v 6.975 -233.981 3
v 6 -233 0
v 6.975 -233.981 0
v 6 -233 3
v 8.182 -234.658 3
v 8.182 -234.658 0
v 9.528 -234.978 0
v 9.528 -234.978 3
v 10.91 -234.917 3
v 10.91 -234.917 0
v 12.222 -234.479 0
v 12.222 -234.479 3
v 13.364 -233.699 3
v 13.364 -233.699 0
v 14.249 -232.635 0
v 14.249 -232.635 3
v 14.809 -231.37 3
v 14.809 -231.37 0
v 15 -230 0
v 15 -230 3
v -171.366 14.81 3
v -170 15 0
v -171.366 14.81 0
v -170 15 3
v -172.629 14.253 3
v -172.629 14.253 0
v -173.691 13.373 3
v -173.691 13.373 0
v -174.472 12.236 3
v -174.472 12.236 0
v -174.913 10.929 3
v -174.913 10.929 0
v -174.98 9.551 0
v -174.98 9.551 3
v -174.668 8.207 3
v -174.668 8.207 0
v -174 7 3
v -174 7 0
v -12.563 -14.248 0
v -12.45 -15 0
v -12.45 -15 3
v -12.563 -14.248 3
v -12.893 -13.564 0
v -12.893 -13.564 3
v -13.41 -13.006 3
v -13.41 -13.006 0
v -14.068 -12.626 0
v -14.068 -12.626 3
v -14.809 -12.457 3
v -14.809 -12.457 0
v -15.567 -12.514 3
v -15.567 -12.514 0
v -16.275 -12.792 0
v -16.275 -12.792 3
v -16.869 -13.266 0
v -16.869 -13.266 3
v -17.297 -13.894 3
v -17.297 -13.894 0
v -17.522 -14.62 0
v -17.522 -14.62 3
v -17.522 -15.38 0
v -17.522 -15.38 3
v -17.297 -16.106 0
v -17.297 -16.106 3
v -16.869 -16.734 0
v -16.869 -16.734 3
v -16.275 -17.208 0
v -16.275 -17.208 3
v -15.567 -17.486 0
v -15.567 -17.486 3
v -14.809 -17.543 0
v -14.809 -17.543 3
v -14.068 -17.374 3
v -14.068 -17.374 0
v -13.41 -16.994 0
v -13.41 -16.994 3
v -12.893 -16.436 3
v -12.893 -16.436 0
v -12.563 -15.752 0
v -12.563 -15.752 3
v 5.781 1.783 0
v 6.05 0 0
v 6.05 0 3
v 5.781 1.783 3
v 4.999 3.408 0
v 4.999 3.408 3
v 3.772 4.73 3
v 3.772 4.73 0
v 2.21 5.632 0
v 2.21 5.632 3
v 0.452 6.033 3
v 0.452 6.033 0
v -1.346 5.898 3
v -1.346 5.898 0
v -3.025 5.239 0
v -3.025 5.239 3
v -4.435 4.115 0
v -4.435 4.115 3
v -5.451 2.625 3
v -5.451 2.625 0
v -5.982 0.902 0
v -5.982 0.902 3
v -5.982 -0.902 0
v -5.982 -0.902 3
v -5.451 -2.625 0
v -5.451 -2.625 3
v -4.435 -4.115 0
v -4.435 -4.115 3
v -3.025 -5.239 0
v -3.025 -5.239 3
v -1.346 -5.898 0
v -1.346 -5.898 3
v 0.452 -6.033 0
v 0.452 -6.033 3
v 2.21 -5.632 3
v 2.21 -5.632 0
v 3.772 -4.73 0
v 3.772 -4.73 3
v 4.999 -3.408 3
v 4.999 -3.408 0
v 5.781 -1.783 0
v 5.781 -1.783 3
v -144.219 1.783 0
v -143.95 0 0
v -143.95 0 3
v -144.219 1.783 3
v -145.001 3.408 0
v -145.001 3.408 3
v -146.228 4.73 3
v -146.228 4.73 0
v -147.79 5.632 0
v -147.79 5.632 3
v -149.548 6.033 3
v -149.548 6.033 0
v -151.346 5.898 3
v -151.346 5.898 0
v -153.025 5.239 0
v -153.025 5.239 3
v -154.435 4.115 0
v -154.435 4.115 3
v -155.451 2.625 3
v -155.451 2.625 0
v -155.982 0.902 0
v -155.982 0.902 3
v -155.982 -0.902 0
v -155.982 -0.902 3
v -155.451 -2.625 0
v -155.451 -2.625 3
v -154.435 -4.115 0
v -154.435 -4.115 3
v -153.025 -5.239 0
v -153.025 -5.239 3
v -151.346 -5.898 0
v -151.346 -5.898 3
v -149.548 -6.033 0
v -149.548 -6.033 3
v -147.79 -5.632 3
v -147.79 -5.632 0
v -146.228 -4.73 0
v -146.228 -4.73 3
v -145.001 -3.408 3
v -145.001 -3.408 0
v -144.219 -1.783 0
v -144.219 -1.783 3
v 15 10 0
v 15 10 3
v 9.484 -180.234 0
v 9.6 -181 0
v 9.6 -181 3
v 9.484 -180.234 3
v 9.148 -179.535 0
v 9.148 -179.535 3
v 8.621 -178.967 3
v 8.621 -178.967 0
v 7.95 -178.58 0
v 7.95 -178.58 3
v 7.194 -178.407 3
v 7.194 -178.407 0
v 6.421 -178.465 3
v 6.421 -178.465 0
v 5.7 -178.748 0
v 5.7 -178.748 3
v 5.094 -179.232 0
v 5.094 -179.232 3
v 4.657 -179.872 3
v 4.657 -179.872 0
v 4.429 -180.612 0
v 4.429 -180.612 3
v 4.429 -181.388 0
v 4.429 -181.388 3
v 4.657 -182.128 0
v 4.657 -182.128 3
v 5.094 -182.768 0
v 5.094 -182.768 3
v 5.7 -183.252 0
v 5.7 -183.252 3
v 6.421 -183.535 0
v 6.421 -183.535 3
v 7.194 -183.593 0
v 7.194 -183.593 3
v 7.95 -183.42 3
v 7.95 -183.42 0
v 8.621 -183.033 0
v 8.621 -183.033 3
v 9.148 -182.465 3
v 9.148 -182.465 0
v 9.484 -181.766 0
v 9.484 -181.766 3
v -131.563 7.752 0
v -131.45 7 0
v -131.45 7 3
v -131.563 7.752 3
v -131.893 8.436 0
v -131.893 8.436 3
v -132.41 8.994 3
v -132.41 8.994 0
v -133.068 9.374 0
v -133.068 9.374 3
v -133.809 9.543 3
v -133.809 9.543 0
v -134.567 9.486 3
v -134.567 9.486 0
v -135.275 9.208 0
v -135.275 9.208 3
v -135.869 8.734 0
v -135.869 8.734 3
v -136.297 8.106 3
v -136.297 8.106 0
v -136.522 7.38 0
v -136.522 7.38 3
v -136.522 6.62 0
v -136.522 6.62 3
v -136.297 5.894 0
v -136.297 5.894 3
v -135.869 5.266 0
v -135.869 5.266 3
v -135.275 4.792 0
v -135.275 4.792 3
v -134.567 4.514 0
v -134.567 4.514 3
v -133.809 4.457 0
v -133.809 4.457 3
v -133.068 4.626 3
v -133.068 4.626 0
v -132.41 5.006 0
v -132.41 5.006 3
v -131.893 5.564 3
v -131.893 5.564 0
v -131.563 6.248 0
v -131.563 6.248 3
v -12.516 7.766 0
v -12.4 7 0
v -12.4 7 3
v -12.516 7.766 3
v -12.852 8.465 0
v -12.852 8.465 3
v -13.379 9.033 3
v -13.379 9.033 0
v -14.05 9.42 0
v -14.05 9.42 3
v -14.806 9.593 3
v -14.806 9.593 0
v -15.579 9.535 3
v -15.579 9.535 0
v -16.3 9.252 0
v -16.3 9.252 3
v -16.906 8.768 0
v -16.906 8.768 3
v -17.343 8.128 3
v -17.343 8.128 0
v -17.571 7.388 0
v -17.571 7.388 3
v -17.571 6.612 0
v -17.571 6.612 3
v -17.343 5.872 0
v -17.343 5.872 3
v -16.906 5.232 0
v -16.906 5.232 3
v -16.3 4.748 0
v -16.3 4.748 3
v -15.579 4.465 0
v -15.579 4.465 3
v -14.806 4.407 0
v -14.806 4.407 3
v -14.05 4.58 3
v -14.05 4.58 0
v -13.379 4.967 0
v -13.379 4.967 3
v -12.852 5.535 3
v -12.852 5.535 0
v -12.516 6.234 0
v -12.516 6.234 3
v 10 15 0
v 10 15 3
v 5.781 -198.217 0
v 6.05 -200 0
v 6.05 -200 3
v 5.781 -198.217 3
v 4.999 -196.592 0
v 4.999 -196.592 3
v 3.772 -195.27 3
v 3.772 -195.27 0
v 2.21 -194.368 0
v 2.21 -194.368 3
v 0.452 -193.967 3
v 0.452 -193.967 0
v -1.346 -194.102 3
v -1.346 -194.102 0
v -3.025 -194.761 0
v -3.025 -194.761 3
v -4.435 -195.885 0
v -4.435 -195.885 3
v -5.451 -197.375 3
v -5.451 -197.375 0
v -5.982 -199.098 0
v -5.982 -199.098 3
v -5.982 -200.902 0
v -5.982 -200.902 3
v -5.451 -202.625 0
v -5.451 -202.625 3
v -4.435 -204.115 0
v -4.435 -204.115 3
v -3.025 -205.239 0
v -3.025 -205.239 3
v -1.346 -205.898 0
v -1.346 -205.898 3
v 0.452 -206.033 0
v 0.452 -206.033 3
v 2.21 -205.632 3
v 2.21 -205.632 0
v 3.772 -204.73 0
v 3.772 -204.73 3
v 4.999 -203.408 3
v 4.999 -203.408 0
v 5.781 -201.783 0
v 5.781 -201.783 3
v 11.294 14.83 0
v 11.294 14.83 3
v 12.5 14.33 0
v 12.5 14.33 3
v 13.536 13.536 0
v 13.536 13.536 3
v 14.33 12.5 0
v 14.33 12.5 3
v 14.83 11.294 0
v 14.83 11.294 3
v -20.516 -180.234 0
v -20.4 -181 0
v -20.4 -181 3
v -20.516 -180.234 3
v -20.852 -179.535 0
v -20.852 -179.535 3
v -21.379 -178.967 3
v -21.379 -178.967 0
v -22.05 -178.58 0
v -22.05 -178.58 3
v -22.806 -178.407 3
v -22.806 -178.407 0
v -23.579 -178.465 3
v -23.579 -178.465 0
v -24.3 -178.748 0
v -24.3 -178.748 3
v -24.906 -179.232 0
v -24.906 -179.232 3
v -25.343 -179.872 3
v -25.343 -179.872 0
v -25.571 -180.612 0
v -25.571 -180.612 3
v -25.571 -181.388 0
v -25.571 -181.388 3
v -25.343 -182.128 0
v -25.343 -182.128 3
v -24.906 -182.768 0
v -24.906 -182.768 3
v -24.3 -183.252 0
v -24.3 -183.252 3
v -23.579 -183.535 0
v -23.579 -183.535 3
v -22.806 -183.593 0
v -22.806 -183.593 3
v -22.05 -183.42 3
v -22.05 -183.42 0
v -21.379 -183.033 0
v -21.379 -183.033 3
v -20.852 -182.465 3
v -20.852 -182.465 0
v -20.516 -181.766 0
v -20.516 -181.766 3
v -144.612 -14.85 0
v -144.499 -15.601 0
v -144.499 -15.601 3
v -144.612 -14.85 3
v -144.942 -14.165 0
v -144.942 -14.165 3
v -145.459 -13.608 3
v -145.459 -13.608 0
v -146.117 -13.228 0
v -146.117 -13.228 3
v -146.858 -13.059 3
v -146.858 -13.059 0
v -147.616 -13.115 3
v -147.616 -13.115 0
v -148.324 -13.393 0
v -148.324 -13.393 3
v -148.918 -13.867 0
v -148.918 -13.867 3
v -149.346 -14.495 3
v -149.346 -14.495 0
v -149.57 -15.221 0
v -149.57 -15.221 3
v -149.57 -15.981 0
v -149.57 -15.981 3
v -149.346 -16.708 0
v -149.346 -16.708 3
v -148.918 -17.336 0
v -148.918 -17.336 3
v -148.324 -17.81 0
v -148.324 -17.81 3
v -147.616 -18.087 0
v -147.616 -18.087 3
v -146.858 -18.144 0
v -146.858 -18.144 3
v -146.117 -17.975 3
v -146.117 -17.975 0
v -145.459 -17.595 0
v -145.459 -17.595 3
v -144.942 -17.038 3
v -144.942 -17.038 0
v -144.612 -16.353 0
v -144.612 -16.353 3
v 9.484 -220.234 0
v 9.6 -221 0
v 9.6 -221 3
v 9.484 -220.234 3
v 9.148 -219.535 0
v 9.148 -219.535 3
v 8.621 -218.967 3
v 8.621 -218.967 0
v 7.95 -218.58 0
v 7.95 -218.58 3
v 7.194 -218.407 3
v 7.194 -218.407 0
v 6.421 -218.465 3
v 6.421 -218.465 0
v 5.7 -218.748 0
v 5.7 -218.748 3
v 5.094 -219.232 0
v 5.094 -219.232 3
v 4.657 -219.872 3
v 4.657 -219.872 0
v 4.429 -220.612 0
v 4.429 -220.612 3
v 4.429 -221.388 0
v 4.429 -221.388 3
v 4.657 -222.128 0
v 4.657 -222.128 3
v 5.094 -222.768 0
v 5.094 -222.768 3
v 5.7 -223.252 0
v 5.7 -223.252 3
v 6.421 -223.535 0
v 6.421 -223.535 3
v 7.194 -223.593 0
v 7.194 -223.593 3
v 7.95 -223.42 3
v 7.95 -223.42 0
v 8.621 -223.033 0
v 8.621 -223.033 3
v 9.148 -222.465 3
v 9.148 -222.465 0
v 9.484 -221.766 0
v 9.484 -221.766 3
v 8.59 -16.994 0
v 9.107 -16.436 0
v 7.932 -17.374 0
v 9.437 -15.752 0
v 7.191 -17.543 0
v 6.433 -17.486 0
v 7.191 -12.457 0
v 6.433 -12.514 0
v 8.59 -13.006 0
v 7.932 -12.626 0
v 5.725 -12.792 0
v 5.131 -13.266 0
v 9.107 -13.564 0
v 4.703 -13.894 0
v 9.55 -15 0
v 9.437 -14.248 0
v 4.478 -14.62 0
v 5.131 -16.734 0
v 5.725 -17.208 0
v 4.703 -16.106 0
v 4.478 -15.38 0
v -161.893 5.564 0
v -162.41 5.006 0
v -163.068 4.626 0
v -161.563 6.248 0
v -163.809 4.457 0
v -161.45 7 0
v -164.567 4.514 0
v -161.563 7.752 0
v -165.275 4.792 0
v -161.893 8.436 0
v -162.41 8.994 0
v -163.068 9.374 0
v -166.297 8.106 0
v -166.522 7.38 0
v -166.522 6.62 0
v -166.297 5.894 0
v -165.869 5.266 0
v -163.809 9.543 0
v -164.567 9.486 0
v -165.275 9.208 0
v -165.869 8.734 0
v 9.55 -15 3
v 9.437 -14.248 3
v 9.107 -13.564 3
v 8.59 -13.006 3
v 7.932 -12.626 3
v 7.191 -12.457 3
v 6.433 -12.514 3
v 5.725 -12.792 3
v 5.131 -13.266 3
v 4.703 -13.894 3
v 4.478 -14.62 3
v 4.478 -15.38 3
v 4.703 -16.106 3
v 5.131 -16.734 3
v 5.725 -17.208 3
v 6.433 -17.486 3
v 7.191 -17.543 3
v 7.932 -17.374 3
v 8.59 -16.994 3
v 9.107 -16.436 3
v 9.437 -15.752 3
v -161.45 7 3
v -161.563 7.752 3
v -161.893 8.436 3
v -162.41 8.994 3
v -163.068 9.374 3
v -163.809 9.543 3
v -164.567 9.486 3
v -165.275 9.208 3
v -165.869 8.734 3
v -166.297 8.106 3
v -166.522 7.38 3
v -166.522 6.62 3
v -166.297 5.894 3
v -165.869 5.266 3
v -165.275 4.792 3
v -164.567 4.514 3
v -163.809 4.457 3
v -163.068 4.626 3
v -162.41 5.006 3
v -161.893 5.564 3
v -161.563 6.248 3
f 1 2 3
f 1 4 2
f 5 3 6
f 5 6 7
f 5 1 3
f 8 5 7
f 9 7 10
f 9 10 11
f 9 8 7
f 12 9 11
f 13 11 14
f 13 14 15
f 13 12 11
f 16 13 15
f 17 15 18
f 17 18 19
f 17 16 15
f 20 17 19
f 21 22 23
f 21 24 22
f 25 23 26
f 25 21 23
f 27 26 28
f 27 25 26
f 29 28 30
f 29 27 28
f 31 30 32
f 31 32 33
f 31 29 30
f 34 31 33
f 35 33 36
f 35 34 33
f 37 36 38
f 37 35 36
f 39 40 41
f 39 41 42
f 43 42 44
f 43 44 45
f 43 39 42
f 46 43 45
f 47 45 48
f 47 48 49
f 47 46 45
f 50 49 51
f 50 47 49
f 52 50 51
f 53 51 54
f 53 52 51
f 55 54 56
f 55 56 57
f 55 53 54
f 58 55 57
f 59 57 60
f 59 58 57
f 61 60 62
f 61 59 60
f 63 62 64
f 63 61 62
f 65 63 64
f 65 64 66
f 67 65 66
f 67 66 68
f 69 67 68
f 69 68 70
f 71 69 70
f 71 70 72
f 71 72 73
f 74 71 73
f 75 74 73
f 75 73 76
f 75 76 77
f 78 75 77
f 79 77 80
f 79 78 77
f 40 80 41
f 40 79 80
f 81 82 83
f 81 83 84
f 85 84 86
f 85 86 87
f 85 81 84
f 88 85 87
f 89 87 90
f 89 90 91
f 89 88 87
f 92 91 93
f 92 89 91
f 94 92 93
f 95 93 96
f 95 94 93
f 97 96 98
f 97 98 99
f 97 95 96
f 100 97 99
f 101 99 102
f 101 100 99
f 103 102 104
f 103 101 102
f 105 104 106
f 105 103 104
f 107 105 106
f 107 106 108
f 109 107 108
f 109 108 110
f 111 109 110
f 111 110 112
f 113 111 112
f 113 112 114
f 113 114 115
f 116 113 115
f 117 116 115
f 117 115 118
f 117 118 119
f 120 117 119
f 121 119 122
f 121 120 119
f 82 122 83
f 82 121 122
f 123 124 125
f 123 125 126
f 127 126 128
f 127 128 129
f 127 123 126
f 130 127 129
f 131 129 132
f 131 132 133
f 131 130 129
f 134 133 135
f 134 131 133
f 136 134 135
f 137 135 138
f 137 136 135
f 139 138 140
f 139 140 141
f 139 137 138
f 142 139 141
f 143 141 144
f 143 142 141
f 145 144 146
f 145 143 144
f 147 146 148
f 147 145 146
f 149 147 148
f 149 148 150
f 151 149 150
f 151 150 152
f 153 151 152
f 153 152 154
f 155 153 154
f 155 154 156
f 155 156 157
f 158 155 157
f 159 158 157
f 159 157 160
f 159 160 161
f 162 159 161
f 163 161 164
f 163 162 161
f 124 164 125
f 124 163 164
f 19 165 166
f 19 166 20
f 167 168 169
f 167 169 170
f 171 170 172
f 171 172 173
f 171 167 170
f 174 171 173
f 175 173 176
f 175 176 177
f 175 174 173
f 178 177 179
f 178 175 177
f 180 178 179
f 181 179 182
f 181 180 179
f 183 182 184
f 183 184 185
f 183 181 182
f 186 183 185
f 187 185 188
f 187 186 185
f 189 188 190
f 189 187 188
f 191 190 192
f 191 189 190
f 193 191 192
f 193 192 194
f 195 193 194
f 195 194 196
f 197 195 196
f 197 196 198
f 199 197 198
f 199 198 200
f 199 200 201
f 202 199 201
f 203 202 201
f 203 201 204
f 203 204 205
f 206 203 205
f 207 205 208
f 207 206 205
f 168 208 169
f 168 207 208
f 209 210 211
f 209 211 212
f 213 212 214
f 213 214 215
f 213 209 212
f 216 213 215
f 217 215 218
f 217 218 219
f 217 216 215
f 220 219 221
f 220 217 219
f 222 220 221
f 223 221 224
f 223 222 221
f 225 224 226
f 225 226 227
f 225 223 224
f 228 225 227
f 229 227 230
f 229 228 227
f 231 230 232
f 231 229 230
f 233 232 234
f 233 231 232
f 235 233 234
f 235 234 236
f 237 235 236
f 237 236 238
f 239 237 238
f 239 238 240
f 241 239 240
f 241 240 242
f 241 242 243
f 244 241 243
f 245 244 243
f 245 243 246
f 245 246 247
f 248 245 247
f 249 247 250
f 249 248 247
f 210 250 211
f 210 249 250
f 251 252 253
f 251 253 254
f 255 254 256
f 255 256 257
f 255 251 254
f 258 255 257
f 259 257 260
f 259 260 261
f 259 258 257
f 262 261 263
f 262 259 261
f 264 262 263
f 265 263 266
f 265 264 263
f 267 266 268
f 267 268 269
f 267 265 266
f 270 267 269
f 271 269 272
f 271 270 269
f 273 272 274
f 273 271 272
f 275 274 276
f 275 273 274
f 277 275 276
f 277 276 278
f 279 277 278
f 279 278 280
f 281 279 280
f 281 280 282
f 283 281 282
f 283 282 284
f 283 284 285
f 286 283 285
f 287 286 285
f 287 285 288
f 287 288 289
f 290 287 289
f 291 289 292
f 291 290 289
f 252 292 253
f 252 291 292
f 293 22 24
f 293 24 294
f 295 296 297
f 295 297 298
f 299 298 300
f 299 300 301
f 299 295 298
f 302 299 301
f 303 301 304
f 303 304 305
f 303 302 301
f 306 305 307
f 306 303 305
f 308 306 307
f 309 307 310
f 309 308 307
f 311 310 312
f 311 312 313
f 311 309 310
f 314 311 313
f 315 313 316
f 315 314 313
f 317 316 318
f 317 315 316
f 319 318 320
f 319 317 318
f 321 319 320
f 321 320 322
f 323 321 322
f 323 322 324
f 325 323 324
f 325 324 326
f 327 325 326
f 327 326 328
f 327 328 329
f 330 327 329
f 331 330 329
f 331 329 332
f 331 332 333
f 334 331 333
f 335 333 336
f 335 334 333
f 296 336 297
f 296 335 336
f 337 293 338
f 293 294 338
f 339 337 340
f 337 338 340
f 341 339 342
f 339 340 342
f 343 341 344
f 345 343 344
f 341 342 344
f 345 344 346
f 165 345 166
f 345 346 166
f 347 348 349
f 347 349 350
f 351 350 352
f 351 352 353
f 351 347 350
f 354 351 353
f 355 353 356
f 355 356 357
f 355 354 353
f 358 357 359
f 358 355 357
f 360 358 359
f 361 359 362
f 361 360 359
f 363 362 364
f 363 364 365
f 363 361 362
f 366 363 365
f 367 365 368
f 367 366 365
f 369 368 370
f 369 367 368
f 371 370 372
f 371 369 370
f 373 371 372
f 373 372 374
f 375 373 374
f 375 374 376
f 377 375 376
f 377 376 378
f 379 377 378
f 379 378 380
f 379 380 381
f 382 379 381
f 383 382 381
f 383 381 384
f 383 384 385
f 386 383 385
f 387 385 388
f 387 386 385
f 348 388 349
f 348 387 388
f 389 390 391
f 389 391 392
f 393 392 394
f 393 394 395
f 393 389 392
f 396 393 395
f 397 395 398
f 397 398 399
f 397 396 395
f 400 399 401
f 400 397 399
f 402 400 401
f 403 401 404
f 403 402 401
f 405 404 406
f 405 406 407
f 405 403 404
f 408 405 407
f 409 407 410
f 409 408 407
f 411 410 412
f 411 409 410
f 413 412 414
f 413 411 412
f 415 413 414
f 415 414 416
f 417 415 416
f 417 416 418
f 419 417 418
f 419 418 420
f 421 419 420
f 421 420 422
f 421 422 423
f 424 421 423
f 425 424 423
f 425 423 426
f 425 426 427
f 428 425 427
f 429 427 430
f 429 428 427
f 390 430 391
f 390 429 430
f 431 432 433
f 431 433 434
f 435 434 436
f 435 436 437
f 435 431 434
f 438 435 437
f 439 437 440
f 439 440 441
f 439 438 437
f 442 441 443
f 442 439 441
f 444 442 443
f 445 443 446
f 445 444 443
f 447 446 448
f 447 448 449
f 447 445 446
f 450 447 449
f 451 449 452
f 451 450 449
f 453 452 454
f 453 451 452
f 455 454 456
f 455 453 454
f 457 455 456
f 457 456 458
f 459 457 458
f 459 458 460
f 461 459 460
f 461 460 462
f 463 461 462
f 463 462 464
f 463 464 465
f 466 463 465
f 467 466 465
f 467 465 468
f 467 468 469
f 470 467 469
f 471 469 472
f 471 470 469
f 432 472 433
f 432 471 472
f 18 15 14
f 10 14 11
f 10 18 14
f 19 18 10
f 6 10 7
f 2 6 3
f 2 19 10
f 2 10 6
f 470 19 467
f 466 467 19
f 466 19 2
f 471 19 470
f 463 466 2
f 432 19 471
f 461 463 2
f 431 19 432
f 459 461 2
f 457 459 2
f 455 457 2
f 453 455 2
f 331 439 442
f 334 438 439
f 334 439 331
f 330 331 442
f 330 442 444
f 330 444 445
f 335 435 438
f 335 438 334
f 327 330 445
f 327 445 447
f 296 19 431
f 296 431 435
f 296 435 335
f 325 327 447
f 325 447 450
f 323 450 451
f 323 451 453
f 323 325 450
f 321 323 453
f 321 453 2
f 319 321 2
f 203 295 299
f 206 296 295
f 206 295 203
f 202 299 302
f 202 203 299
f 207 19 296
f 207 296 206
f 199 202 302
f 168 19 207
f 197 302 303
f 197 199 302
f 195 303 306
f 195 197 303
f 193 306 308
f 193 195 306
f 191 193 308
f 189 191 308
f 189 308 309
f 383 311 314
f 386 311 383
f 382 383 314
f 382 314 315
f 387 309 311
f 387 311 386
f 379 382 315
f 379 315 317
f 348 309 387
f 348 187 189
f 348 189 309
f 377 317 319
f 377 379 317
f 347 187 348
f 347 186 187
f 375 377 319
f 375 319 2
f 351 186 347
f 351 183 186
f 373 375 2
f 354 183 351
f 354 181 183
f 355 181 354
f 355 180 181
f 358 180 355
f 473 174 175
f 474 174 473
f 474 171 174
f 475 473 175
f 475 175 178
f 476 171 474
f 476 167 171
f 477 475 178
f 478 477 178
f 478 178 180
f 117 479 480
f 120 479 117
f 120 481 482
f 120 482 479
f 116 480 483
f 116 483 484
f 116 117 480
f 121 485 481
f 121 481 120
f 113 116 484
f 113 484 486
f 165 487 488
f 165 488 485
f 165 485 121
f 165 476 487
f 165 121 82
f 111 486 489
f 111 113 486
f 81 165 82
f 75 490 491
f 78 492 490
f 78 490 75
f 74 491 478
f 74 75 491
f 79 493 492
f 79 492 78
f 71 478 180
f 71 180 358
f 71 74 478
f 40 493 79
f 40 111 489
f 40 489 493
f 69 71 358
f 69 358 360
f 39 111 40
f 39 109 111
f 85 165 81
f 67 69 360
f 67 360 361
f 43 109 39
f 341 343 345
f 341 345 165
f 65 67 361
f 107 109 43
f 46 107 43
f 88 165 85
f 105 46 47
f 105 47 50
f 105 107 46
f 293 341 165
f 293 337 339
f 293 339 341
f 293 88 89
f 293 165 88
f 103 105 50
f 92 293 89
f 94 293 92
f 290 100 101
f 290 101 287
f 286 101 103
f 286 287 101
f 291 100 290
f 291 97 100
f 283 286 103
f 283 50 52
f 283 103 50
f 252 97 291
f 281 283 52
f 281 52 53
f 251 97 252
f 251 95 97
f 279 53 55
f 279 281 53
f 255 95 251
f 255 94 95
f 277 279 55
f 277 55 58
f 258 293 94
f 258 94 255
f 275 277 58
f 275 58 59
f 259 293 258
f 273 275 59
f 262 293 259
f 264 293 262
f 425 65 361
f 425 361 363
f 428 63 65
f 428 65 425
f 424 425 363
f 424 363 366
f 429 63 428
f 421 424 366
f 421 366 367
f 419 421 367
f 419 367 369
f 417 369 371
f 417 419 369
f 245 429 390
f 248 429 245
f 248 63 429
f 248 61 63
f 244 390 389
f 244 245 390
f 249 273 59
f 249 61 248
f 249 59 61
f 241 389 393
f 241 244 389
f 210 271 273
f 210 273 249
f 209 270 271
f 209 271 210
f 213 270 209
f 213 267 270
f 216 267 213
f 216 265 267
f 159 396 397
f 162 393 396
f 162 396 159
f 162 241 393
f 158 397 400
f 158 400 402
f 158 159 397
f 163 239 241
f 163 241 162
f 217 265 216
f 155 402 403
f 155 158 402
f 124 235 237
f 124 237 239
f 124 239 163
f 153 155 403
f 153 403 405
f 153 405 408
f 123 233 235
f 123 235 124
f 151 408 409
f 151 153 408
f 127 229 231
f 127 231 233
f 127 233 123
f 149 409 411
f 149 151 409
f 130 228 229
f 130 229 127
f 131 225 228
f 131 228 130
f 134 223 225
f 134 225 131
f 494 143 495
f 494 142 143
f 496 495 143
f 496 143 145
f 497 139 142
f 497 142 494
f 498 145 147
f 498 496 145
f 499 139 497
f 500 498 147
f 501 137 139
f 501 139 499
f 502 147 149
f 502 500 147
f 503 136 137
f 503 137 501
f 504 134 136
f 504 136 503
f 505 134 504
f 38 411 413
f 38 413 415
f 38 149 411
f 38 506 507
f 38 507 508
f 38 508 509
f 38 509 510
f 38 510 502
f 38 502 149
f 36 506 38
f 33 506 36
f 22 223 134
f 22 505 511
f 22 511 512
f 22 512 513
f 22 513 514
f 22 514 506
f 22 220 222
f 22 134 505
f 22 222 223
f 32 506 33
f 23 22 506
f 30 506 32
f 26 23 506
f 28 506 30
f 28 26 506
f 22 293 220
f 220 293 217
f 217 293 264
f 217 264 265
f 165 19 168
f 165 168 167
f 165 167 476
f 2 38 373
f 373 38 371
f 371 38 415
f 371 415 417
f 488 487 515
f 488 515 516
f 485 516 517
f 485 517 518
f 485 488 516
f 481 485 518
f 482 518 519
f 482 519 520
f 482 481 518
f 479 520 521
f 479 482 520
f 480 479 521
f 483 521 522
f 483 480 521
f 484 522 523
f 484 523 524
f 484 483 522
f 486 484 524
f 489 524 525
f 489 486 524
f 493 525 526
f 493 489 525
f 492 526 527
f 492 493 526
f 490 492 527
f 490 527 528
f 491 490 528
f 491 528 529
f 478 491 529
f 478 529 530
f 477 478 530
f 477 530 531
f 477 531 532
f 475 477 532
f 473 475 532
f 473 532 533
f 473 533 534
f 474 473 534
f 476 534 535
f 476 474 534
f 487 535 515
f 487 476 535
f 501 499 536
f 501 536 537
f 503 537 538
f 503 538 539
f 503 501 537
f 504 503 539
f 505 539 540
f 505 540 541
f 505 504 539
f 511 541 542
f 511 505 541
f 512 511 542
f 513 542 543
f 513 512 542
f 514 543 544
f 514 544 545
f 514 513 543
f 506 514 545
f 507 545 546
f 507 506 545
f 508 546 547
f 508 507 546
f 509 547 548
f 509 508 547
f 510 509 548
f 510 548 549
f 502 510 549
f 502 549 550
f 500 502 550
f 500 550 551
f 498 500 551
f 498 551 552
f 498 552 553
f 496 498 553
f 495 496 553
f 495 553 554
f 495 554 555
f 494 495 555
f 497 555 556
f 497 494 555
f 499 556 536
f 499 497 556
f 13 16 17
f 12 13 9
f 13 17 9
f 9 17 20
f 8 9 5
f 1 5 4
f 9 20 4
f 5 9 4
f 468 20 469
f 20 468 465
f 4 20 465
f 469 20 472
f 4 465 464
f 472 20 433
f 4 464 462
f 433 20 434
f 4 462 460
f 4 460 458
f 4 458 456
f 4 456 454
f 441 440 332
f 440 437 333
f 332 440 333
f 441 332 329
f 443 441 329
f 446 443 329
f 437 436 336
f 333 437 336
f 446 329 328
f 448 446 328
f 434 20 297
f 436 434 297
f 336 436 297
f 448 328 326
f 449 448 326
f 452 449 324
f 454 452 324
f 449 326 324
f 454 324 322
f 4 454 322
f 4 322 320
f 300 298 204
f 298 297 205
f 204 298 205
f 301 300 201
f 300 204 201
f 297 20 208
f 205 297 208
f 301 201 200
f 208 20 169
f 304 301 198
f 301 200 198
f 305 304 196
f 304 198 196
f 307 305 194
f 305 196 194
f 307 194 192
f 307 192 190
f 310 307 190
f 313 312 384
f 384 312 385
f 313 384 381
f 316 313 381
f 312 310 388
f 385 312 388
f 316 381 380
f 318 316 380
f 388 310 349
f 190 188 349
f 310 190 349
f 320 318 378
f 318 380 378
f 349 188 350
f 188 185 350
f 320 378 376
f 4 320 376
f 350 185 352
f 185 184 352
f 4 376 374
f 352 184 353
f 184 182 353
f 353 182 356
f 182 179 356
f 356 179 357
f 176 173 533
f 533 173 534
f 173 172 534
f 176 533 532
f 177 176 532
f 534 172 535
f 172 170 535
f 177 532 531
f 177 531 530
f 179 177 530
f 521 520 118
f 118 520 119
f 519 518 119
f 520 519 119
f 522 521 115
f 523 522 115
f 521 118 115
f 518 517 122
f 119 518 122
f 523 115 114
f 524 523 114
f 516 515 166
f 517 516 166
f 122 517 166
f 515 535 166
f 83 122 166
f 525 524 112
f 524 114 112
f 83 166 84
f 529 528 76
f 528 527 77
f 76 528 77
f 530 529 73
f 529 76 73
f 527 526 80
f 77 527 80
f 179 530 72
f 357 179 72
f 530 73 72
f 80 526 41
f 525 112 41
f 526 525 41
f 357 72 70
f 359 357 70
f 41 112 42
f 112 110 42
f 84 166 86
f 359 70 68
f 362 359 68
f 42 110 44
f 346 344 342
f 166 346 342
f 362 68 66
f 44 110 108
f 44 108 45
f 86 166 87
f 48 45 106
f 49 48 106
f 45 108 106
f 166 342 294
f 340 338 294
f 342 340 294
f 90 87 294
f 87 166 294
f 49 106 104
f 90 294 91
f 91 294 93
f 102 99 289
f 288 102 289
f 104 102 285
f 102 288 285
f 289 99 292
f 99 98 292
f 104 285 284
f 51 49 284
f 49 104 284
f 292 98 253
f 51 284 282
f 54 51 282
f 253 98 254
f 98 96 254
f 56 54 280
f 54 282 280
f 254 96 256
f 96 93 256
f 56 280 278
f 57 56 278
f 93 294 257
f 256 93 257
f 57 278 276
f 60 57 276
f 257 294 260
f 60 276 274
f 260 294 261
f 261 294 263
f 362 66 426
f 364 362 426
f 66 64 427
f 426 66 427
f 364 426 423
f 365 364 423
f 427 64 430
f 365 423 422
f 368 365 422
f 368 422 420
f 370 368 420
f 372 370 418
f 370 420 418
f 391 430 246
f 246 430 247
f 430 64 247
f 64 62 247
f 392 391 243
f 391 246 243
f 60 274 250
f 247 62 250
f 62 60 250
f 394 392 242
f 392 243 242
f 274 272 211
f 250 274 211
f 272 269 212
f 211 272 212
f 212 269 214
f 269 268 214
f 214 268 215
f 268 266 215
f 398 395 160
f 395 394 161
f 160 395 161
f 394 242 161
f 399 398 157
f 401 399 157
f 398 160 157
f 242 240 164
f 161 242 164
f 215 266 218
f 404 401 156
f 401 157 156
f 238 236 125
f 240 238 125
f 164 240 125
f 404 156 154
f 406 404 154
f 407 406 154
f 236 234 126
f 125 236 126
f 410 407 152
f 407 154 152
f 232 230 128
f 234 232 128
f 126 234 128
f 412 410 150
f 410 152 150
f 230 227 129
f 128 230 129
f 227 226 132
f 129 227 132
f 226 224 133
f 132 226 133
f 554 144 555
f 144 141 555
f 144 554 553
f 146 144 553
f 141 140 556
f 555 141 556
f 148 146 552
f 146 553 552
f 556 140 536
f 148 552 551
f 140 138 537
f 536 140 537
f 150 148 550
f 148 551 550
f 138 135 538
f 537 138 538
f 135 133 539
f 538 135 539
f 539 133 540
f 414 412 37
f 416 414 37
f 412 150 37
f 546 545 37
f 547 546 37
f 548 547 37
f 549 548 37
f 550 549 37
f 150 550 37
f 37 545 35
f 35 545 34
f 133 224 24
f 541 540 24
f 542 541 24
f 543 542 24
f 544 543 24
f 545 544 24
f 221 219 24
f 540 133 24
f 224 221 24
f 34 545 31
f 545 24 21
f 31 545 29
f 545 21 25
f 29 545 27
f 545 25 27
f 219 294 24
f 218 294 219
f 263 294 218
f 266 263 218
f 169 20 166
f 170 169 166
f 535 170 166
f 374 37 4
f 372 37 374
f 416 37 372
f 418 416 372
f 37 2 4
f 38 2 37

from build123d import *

# Parameters (mm, degrees)
SKETCH_2_R      = 6.05
SKETCH_2_R_2    = 2.55
SKETCH_2_R_3    = 2.6
EXTRUDE_1_DEPTH = 3
FILLET_1_R      = 5


with BuildPart() as part:
    # 草图2 → 凸台-拉伸1 (new body)
    with BuildSketch(Plane.XY):
        Polygon((-180, 15), (15, 15), (15, -245), align=None)
        Circle(SKETCH_2_R, mode=Mode.SUBTRACT)
        with Locations((-150, 0)):
            Circle(SKETCH_2_R, mode=Mode.SUBTRACT)
        with Locations((0, -200)):
            Circle(SKETCH_2_R, mode=Mode.SUBTRACT)
        with Locations((-164, 7)):
            Circle(SKETCH_2_R_2, mode=Mode.SUBTRACT)
        with Locations((-134, 7)):
            Circle(SKETCH_2_R_2, mode=Mode.SUBTRACT)
        with Locations((-147.04893552, -15.601419306)):
            Circle(SKETCH_2_R_2, mode=Mode.SUBTRACT)
        with Locations((-15, 7)):
            Circle(SKETCH_2_R_3, mode=Mode.SUBTRACT)
        with Locations((7, -15)):
            Circle(SKETCH_2_R_2, mode=Mode.SUBTRACT)
        with Locations((7, -221)):
            Circle(SKETCH_2_R_3, mode=Mode.SUBTRACT)
        with Locations((-23, -181)):
            Circle(SKETCH_2_R_3, mode=Mode.SUBTRACT)
        with Locations((7, -181)):
            Circle(SKETCH_2_R_3, mode=Mode.SUBTRACT)
        with Locations((-15, -15)):
            Circle(SKETCH_2_R_2, mode=Mode.SUBTRACT)
    extrude(amount=EXTRUDE_1_DEPTH)

    # 圆角1
    fillet_1_edges = [part.edges().sort_by_distance(p)[0] for p in [
        (-180, 15, 1.5),
        (15, 15, 1.5),
        (15, -245, 1.5),
    ]]
    fillet(fillet_1_edges, radius=FILLET_1_R)


solid = part.part
